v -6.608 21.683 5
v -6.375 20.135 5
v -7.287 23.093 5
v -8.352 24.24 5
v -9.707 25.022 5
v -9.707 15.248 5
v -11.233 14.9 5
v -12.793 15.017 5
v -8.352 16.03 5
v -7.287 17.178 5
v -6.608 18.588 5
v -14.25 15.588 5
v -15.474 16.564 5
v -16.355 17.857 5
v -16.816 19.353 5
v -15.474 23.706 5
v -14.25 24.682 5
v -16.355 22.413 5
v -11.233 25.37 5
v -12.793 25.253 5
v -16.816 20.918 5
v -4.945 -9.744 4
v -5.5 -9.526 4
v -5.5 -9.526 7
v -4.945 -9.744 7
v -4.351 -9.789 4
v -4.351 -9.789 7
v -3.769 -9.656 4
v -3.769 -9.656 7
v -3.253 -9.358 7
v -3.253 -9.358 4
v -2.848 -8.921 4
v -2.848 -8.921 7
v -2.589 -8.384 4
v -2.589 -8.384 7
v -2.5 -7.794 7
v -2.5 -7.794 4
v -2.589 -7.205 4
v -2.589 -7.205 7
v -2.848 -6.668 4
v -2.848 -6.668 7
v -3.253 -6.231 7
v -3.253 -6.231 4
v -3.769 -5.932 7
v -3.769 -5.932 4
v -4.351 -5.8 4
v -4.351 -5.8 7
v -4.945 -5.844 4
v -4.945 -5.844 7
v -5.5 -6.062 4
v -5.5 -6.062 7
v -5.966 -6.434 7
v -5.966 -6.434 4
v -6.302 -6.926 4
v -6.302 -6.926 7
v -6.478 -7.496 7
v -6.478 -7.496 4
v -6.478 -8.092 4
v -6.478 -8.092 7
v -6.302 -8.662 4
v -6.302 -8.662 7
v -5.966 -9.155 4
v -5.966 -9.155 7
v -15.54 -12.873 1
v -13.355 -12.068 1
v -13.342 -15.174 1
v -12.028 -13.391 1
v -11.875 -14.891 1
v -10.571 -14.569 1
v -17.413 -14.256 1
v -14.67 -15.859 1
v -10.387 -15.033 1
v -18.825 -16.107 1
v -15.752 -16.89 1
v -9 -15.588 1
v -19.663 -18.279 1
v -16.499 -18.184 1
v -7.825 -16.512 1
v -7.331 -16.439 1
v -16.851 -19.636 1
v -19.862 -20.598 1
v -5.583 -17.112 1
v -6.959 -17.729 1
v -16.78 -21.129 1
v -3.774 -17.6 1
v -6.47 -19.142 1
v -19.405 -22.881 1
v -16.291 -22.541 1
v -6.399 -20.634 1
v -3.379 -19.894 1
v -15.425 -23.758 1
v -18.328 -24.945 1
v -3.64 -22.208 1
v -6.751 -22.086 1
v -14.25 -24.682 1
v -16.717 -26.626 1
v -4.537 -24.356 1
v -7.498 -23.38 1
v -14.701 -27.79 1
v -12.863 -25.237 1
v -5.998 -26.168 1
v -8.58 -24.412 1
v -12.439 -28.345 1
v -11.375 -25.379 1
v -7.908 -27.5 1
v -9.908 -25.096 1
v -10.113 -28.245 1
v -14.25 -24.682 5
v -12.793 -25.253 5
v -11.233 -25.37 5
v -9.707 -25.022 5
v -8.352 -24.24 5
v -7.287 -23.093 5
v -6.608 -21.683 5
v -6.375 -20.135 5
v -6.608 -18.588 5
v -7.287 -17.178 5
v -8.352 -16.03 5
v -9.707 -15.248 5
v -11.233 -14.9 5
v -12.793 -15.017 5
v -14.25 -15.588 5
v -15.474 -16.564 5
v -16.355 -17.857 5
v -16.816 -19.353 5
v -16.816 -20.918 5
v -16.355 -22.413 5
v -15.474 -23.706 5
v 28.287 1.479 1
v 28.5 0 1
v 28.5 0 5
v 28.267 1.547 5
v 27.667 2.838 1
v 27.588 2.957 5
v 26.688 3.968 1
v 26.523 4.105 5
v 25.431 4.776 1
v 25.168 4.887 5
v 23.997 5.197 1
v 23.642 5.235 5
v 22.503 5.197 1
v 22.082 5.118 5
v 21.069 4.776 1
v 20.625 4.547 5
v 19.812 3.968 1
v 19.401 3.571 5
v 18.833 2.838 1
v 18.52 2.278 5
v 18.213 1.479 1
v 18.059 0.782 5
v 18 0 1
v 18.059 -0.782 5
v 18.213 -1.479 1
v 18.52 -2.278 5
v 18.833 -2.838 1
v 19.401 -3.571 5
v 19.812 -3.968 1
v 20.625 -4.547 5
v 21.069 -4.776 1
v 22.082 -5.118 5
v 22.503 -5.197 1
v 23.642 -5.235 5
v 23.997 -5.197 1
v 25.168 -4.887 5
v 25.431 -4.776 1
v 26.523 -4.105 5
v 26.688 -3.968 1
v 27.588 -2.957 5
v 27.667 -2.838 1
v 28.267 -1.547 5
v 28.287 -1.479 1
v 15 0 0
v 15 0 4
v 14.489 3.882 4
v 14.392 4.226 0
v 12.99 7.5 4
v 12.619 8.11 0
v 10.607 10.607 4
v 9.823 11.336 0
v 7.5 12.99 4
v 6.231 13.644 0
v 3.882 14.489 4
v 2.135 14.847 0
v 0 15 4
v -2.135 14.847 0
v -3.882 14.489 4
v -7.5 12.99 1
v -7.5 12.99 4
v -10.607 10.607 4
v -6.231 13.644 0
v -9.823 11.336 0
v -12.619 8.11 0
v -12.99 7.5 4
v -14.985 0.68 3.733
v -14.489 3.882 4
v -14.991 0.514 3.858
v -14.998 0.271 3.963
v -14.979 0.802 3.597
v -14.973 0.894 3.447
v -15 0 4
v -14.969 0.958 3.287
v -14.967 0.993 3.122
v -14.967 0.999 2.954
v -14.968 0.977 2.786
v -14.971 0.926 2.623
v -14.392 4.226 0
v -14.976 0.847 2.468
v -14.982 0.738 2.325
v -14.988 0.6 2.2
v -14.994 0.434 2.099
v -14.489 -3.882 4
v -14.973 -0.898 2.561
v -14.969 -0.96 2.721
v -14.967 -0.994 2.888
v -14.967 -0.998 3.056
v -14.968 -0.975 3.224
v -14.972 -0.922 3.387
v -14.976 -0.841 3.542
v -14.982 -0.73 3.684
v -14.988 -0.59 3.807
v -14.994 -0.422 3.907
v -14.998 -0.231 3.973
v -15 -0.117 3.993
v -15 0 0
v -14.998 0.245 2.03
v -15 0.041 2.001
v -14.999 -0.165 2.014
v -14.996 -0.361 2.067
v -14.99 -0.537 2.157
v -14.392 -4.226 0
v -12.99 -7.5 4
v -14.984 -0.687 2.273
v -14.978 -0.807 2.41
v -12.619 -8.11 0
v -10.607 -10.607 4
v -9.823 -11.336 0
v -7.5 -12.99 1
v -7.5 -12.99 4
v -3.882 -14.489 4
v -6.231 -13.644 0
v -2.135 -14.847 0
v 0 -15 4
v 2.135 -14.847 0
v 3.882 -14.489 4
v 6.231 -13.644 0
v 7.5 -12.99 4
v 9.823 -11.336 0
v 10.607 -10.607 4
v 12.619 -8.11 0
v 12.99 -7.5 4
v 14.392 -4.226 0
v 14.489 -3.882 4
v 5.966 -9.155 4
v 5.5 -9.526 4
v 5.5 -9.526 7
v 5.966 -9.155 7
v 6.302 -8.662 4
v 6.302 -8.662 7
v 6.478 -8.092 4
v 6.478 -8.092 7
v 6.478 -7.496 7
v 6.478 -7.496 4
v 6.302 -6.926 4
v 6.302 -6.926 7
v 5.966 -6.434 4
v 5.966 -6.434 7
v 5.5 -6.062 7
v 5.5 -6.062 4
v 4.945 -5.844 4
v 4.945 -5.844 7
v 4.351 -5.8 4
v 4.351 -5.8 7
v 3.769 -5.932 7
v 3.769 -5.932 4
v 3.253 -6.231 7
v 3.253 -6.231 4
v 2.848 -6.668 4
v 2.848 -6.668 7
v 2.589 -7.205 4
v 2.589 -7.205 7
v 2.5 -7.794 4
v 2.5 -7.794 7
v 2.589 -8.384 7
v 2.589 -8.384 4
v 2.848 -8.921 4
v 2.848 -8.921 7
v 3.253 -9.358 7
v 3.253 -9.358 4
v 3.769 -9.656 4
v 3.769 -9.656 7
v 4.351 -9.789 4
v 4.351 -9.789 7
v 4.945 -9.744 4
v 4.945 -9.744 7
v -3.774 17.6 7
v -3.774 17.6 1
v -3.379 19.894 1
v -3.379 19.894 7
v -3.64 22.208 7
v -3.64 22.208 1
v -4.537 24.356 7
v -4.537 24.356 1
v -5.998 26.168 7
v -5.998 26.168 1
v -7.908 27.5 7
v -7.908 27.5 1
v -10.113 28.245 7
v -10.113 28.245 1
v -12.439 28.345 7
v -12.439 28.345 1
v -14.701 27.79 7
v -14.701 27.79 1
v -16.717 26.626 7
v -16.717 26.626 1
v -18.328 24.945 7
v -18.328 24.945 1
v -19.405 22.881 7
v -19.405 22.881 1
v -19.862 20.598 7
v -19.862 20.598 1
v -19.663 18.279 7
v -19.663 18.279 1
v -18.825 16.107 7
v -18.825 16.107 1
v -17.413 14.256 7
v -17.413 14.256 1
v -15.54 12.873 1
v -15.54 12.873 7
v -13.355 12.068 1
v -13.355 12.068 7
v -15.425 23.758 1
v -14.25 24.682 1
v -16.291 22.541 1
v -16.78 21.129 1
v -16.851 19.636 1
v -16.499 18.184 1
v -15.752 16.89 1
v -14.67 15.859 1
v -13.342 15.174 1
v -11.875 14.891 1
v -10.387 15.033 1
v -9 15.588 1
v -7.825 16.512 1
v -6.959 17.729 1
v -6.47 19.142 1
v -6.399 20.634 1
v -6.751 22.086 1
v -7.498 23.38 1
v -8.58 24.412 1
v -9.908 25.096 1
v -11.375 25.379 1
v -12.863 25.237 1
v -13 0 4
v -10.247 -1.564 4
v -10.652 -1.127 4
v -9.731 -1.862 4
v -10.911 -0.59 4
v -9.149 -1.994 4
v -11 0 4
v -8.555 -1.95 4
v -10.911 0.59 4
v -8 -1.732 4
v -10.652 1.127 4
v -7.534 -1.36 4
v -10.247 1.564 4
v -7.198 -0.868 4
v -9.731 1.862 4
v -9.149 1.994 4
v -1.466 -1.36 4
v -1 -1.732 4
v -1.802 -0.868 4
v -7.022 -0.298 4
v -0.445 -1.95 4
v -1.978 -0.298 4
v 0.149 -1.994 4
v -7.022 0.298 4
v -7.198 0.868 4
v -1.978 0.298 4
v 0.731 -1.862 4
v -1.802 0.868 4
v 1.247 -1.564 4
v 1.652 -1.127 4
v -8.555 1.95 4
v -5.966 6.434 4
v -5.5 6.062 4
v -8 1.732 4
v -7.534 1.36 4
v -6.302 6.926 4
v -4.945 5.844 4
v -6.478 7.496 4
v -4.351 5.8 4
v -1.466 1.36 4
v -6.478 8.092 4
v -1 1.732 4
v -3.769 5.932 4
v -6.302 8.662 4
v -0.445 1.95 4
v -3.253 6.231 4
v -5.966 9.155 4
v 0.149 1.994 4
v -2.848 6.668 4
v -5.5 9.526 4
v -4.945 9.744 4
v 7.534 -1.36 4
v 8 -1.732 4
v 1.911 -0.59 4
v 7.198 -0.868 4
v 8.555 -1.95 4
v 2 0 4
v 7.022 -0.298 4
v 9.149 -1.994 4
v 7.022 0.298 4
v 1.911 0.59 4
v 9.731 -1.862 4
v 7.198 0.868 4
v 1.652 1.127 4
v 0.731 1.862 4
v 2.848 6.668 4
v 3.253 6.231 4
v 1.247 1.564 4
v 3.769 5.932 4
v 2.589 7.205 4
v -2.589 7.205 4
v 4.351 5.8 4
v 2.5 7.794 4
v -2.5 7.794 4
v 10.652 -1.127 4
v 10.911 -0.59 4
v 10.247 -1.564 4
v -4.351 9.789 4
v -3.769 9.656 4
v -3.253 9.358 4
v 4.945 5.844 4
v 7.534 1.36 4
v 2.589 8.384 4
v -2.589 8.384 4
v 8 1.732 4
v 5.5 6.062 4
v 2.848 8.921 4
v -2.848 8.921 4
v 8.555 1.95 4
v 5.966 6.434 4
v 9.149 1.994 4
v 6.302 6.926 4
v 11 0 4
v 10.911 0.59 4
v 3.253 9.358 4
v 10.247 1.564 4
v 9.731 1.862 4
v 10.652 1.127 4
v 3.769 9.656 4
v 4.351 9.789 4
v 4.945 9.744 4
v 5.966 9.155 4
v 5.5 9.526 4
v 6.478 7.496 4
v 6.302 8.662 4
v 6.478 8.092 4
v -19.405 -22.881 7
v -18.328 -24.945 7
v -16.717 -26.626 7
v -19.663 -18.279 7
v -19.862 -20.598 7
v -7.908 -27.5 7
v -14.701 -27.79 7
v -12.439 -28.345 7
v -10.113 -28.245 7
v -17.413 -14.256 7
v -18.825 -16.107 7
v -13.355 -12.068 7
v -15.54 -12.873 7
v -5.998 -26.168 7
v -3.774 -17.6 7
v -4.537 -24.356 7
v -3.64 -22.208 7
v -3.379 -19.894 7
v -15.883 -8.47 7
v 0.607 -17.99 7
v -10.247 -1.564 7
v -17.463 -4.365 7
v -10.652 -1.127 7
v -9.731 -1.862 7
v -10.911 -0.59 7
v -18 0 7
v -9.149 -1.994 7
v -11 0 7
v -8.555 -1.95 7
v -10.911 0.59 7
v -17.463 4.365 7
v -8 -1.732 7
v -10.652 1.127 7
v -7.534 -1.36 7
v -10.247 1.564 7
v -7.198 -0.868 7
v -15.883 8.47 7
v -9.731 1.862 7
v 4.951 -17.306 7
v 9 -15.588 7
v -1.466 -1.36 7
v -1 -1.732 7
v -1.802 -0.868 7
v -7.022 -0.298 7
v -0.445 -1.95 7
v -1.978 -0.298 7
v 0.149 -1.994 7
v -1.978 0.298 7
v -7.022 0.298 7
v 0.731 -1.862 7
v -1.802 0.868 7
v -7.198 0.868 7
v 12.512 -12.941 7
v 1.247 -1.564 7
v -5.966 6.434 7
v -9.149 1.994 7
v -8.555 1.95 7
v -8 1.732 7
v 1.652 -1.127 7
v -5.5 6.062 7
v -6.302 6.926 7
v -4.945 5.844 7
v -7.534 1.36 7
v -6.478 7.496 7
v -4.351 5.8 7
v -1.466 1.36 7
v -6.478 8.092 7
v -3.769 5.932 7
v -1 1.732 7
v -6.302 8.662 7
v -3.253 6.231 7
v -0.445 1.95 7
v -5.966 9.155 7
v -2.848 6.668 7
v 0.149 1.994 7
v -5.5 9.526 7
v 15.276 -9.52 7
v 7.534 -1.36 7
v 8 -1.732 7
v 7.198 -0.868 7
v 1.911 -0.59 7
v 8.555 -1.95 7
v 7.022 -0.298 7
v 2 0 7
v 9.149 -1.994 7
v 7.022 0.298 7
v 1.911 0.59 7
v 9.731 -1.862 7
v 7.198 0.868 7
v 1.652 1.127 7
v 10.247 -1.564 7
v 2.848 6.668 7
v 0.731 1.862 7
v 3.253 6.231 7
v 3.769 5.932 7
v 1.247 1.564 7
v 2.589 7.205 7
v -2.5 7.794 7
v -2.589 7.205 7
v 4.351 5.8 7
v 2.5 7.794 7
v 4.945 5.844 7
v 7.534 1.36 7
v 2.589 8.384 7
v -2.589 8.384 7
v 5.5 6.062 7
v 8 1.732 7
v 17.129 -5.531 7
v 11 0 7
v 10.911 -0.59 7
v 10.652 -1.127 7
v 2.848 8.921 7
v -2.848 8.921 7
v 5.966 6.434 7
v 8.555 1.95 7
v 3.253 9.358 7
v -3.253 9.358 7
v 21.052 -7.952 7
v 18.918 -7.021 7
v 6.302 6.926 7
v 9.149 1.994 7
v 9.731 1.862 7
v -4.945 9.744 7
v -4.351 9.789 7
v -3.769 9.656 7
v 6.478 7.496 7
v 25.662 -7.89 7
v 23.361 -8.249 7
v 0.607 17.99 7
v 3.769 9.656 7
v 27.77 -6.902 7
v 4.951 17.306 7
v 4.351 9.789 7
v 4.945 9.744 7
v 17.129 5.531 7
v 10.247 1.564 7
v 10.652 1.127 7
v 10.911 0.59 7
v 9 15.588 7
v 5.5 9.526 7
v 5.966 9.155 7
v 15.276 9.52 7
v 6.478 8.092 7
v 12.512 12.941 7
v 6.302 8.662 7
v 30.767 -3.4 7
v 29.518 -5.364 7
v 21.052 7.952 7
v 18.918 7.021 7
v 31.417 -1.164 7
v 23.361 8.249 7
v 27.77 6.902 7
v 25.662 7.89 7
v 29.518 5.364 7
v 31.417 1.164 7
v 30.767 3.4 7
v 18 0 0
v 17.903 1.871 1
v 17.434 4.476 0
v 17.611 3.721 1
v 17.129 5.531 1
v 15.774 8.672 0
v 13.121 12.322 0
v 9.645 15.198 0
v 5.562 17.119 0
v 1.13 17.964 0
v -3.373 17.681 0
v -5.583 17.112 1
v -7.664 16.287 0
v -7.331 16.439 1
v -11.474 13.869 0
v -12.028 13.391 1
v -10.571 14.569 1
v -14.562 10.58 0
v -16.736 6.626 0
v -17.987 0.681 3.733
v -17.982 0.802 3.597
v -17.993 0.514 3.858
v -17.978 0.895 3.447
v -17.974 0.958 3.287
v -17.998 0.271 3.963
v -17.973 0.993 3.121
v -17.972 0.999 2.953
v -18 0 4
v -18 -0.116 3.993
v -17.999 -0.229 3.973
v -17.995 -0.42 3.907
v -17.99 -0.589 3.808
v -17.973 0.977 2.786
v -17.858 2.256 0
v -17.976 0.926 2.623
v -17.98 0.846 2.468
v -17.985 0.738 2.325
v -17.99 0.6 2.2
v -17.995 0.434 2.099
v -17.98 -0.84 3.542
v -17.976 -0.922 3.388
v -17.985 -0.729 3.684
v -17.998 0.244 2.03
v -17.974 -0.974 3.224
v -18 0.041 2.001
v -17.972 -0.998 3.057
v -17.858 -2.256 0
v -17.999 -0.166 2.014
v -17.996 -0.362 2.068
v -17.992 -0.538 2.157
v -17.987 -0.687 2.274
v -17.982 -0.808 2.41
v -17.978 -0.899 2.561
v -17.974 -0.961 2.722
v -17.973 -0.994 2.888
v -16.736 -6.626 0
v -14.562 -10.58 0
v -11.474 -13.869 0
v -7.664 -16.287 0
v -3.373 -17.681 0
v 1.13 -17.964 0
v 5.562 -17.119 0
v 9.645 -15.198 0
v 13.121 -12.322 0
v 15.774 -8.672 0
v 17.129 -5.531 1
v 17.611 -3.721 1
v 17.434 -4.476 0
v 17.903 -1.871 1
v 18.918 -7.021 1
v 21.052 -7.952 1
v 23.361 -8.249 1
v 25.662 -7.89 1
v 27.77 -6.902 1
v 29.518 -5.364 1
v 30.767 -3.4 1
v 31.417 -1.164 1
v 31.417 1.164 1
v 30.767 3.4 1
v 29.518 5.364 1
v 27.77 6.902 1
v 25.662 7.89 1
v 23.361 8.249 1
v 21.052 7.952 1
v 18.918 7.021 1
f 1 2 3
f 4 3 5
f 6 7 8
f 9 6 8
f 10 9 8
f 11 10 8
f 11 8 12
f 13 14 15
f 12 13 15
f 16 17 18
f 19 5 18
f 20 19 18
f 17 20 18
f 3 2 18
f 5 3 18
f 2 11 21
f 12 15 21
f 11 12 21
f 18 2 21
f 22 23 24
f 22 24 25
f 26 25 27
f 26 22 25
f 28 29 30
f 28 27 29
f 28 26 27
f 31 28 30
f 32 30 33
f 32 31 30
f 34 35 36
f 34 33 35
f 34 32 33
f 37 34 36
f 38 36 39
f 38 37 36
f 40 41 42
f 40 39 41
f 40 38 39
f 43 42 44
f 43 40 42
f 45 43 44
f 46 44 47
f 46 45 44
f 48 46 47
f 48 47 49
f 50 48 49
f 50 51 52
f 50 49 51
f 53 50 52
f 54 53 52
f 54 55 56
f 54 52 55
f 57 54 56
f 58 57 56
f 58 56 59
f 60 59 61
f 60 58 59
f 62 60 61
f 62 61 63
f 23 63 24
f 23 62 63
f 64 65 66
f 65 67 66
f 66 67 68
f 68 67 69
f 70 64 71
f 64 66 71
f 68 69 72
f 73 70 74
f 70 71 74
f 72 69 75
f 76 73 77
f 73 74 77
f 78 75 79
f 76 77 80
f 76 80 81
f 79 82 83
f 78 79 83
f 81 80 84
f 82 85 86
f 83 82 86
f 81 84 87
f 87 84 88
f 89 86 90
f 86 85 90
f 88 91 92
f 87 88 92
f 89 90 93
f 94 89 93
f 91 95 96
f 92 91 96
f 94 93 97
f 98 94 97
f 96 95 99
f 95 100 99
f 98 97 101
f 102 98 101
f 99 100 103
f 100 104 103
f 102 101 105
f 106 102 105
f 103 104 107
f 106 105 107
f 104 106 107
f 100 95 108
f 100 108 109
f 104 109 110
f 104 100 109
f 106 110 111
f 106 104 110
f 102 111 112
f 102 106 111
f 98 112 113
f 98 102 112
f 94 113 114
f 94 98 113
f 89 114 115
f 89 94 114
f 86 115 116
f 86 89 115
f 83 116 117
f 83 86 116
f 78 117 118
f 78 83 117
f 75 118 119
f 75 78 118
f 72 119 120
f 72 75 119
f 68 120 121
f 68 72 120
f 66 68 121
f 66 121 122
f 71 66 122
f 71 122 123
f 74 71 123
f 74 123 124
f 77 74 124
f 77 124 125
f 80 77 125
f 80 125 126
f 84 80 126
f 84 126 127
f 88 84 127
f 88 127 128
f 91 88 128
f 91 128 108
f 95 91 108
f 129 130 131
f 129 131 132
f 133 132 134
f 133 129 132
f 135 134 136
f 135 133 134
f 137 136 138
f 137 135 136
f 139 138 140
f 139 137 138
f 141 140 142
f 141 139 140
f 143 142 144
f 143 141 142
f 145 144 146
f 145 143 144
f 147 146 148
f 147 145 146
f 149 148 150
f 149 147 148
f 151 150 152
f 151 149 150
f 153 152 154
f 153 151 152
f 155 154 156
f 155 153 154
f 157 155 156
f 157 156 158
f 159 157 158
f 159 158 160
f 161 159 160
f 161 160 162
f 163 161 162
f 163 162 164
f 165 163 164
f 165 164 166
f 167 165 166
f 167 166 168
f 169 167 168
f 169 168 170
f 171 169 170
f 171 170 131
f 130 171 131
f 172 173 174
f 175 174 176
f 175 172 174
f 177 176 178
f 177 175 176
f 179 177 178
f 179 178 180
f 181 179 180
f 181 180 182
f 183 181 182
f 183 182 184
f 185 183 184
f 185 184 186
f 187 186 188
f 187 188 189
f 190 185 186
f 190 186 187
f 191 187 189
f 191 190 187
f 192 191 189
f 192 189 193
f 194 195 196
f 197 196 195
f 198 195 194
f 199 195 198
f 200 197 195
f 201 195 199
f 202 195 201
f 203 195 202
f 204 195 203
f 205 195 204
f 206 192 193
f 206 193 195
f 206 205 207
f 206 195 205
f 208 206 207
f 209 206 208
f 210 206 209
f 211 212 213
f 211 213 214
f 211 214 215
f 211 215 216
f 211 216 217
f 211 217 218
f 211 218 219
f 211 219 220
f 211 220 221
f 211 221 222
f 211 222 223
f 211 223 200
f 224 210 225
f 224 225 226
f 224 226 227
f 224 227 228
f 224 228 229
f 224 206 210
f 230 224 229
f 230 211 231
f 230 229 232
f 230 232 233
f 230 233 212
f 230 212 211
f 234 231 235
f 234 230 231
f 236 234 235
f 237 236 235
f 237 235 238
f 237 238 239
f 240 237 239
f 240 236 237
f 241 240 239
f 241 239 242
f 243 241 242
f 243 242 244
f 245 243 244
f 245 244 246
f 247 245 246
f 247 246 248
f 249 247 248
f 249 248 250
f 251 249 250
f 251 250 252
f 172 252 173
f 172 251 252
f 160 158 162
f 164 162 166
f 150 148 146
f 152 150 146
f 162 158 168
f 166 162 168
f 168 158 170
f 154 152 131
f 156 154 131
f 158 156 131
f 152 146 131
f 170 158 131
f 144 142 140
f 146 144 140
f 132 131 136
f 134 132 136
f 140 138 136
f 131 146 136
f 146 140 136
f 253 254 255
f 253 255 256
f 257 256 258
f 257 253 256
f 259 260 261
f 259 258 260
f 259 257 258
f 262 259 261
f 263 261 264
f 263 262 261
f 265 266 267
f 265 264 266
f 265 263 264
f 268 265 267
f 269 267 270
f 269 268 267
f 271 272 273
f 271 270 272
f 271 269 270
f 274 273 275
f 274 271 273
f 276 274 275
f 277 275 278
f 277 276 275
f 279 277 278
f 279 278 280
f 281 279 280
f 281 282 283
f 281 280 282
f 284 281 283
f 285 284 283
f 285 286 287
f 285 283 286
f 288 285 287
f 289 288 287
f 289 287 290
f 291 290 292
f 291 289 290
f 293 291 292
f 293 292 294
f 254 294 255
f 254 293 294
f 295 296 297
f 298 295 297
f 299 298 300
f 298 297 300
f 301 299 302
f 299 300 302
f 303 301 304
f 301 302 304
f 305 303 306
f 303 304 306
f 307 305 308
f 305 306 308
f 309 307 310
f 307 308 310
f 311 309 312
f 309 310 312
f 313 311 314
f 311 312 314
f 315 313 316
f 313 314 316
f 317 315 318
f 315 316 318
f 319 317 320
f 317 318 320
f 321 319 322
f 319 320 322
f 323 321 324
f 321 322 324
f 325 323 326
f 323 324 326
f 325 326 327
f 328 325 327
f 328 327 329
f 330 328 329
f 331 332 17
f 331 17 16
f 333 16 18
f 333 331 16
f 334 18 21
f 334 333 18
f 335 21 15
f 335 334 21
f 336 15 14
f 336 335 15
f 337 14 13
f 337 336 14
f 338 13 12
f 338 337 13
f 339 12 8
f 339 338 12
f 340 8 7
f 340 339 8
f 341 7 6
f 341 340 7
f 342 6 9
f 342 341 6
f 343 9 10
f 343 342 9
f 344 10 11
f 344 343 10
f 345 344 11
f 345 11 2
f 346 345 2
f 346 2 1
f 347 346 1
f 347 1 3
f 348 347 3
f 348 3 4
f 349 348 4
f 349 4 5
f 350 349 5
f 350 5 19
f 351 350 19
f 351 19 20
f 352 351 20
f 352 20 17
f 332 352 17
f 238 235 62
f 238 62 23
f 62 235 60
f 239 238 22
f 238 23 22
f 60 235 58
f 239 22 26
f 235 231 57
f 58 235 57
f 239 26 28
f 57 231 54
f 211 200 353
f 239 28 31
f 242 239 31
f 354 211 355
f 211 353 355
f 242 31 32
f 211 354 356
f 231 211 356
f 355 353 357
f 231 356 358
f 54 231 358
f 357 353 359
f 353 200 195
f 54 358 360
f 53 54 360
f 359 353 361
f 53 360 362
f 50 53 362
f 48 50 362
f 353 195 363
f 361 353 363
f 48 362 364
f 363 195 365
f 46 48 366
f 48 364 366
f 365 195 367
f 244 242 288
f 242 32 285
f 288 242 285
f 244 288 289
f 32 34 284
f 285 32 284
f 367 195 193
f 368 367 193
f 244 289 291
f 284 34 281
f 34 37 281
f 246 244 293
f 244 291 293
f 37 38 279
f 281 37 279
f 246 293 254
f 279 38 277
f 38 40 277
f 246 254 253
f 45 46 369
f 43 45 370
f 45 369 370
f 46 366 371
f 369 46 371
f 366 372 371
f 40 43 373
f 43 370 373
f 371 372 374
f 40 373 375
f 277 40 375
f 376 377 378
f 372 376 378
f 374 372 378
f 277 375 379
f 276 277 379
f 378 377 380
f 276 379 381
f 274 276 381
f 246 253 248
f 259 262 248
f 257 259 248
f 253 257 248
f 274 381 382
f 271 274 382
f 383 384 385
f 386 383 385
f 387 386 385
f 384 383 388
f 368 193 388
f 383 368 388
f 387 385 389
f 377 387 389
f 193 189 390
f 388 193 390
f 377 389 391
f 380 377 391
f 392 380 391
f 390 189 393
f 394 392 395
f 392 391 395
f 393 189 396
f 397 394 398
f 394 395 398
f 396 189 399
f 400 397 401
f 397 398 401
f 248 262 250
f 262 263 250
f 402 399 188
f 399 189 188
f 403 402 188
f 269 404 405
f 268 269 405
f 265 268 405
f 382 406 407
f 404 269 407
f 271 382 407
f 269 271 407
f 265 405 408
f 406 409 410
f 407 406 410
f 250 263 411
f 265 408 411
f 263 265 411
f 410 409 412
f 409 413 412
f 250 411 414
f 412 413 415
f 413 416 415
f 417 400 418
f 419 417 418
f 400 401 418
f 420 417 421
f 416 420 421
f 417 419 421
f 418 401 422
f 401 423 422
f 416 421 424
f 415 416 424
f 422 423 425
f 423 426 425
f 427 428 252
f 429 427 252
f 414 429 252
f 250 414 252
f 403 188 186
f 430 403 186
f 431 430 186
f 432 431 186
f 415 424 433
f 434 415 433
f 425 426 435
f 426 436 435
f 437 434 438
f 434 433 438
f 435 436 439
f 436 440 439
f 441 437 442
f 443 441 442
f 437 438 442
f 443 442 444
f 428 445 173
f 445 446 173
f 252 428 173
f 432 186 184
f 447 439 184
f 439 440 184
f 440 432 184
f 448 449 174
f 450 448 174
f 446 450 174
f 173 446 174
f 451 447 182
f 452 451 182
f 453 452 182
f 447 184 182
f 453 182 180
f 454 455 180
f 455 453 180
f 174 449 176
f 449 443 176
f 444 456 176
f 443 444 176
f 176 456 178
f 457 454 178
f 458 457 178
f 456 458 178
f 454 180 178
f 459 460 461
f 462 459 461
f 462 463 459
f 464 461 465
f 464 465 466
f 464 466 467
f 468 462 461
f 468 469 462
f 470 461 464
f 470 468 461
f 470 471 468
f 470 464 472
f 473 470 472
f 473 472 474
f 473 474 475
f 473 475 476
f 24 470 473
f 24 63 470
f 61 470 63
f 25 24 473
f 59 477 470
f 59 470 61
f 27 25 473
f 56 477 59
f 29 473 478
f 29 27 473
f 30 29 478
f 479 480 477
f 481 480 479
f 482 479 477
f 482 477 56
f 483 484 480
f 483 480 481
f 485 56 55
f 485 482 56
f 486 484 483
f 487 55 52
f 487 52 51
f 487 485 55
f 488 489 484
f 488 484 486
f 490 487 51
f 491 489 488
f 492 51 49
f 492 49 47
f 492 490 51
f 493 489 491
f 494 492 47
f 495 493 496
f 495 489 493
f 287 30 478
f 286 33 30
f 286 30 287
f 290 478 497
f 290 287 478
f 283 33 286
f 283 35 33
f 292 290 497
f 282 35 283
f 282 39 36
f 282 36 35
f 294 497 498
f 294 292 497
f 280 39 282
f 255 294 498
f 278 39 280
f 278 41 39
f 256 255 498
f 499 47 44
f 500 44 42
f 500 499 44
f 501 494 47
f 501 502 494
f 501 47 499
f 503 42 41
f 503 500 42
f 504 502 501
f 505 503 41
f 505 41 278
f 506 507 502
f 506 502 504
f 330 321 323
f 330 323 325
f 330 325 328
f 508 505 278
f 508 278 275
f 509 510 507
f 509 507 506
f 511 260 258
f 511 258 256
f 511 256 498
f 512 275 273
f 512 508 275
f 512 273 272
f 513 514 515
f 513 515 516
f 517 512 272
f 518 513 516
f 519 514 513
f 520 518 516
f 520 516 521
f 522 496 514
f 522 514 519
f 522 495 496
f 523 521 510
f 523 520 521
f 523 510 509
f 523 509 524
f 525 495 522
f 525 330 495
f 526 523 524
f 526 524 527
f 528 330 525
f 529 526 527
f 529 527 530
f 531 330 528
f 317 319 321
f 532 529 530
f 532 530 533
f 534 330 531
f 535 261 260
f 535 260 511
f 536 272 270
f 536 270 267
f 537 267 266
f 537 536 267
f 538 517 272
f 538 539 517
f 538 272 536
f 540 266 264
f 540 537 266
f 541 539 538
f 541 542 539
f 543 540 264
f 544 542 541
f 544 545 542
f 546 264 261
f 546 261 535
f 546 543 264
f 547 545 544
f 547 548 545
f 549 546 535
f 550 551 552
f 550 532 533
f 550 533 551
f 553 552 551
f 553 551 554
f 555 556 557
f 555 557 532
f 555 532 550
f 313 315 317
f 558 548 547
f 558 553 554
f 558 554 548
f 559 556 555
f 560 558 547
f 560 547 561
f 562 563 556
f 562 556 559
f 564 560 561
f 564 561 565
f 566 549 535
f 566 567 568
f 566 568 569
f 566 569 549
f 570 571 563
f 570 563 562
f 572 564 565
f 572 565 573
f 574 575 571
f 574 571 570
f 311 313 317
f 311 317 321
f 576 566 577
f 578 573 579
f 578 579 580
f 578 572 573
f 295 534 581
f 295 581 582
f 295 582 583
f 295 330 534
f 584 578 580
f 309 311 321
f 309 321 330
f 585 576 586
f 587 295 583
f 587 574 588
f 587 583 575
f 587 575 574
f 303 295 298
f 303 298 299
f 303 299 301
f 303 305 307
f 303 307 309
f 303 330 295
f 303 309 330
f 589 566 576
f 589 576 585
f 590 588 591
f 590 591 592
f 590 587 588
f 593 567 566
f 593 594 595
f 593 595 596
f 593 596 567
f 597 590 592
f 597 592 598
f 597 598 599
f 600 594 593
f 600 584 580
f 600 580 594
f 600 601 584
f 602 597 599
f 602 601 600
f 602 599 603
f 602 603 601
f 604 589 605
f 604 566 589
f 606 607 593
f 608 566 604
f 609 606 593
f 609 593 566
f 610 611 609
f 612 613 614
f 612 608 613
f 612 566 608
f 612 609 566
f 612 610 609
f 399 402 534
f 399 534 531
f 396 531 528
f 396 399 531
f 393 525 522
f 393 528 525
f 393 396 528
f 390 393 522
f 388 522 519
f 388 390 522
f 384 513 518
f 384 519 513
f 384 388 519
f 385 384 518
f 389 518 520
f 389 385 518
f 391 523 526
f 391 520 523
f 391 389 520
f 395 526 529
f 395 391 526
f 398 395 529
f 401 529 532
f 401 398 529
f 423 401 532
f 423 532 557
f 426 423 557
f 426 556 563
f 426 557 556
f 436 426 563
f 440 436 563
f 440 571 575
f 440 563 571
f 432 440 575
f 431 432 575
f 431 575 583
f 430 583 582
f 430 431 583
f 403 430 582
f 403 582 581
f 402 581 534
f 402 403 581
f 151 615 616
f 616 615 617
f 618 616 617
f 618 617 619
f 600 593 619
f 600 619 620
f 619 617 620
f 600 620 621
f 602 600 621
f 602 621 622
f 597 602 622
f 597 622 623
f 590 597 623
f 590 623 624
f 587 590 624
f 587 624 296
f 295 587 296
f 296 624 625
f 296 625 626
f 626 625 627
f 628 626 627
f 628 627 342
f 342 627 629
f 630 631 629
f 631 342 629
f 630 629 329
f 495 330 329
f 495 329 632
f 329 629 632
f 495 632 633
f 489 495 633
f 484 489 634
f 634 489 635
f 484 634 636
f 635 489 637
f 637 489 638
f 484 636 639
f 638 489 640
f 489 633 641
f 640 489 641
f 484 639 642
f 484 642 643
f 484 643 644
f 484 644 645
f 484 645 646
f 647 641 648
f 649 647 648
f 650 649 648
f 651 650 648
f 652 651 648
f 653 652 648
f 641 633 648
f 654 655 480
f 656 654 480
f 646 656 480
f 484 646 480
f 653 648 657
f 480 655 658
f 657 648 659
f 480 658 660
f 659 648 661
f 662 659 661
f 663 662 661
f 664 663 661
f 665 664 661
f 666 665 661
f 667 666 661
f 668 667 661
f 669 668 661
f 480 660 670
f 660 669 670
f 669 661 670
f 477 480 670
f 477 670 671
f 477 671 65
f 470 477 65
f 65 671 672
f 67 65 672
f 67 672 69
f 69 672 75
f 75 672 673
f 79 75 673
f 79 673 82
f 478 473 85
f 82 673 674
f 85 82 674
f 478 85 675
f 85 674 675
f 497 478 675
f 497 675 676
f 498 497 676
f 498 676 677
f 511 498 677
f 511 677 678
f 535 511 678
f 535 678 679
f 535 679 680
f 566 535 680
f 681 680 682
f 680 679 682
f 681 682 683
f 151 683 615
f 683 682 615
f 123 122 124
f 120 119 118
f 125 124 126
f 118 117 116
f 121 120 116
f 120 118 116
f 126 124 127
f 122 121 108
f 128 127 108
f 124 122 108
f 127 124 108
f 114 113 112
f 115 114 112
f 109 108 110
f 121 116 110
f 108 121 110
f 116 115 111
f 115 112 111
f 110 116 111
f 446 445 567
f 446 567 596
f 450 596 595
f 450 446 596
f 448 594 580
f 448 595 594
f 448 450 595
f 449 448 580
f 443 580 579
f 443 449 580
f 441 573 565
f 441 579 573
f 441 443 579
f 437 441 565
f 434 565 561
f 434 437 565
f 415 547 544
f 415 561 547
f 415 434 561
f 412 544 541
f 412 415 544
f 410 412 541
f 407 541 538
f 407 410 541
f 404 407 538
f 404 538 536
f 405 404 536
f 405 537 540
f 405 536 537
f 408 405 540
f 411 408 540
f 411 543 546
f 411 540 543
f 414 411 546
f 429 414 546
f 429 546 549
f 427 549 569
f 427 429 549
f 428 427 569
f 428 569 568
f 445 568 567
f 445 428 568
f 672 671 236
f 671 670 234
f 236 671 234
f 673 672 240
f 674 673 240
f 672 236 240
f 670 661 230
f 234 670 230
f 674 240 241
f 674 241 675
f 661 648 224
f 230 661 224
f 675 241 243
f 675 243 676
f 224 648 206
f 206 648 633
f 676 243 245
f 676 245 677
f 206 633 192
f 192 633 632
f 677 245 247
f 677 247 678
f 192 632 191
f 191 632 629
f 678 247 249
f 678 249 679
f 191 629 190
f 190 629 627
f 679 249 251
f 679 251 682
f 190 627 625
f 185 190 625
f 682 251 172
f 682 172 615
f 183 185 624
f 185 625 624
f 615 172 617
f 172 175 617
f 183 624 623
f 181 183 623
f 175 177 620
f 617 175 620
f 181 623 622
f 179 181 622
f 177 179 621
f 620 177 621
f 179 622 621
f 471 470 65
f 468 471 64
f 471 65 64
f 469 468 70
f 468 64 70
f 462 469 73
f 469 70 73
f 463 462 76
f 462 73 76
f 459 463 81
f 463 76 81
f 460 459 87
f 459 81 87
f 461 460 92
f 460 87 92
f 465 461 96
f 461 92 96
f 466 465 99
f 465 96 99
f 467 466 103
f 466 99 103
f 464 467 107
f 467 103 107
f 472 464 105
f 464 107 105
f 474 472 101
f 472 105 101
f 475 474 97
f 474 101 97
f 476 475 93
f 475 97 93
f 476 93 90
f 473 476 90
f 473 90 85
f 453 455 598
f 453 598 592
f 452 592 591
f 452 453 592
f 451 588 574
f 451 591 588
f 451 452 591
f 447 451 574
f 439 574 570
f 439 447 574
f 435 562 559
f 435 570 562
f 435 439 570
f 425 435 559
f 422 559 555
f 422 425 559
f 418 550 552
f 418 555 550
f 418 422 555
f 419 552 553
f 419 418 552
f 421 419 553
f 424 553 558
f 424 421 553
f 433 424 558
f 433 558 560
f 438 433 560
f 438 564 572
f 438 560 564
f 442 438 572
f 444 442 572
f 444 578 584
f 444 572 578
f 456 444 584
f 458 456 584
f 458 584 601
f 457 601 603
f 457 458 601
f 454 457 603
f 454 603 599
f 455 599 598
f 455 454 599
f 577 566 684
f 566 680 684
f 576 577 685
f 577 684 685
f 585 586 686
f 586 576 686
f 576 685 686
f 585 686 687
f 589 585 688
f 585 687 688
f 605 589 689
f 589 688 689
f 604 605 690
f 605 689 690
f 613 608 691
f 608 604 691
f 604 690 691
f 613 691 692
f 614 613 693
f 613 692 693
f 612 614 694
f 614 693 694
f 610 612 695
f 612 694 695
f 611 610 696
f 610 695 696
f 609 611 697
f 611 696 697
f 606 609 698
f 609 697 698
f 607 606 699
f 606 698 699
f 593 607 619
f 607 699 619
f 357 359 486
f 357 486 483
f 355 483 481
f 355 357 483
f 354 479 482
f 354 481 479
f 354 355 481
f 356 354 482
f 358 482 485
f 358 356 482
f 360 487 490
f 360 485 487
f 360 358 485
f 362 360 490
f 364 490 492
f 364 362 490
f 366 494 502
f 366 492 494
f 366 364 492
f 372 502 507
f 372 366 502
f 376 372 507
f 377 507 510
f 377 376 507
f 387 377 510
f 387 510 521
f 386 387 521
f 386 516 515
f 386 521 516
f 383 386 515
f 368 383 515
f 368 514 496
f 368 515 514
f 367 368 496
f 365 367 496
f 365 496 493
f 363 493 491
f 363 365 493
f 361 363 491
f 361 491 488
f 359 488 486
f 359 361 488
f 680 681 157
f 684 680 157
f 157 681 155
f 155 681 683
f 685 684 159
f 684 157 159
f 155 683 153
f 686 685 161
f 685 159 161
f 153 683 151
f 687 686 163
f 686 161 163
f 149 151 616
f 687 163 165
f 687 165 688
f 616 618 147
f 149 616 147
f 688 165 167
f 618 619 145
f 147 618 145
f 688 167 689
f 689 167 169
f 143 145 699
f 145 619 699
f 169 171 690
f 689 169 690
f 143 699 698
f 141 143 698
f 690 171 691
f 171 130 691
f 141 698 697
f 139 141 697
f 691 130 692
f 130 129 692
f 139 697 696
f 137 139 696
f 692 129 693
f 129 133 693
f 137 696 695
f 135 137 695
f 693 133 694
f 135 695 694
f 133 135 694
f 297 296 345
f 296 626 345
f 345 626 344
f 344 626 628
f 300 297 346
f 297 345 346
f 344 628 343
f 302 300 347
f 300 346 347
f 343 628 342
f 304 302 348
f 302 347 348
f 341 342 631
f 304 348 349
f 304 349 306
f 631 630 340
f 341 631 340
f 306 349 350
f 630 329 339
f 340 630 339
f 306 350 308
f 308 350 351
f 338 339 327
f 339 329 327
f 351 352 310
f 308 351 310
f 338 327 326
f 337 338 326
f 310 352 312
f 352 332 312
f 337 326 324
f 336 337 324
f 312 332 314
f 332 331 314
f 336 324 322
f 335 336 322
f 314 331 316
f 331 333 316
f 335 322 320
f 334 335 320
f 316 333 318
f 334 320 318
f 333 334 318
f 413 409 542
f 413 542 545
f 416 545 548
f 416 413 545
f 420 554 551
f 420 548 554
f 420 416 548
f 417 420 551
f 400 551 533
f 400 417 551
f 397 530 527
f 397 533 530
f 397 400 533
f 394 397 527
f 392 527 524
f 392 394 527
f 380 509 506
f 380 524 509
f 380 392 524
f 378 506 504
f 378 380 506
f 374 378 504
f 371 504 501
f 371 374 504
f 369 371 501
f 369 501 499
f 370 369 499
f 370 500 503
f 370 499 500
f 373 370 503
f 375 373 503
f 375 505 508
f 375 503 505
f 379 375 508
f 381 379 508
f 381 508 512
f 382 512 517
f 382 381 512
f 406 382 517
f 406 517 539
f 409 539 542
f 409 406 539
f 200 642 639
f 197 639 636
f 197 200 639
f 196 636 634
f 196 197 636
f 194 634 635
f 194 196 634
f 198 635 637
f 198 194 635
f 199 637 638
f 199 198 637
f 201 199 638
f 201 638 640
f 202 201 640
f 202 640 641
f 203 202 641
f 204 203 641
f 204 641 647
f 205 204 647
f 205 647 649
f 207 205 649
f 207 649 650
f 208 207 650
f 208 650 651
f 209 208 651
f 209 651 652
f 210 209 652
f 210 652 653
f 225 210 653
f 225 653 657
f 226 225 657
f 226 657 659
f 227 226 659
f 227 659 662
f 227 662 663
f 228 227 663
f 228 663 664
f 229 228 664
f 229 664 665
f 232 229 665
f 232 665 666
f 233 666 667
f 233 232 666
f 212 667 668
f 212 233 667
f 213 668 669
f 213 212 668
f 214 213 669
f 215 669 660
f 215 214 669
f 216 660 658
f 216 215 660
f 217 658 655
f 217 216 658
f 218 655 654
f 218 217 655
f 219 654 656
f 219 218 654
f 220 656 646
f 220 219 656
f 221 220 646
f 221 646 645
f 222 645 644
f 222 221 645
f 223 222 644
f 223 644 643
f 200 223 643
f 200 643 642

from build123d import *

# Parameters (mm, degrees)
CYLINDER008_R     = 2
CYLINDER008_DEPTH = 10
ARRAY002_COUNT    = 6
CYLINDER035_R     = 1
CYLINDER035_DEPTH = 10
CYLINDER009_R     = 2
CYLINDER009_DEPTH = 10
CYLINDER001_R     = 15
CYLINDER001_DEPTH = 4
CYLINDER_R        = 18
CYLINDER_DEPTH    = 7
CYLINDER002_R     = 5.25
CYLINDER002_DEPTH = 4
CYLINDER003_R     = 8.25
CYLINDER003_DEPTH = 6
ARRAY_COUNT       = 3


with BuildPart() as array002:
    # Cylinder008 → Cylinder008 (new body)
    with BuildSketch(Plane(origin=(9, 0, 0), x_dir=(1, 0, 0), z_dir=(0, 0, 1))):
        Circle(CYLINDER008_R)
    extrude(amount=CYLINDER008_DEPTH)

    # Array002: Array002 ×6 about axis
    array002_axis = Axis((0, 0, 0), (0, 0, 1))


with BuildPart() as array002_1:
    add(array002.part)
    for i in range(1, ARRAY002_COUNT):
        add(array002.part.rotate(array002_axis, i * 360 / ARRAY002_COUNT))


with BuildPart() as cylinder010:
    # Cylinder035 → Cylinder035 (new body)
    with BuildSketch(Plane(origin=(-13, 0, 3), x_dir=(0, 0, 1), z_dir=(-1, 0, 0))):
        Circle(CYLINDER035_R)
    extrude(amount=CYLINDER035_DEPTH)


with BuildPart() as fusion027:
    # Cylinder009 → Cylinder009 (new body)
    with BuildSketch(Plane.XY):
        Circle(CYLINDER009_R)
    extrude(amount=CYLINDER009_DEPTH)

    # Fusion027: union Array002, Cylinder010
    add(array002_1.part)
    add(cylinder010.part)


with BuildPart() as cylinder001:
    # Cylinder001 → Cylinder001 (new body)
    with BuildSketch(Plane.XY):
        Circle(CYLINDER001_R)
    extrude(amount=CYLINDER001_DEPTH)


with BuildPart() as cut:
    # Cylinder → Cylinder (new body)
    with BuildSketch(Plane.XY):
        Circle(CYLINDER_R)
    extrude(amount=CYLINDER_DEPTH)

    # Cut: cut Cylinder001
    add(cylinder001.part, mode=Mode.SUBTRACT)


with BuildPart() as cylinder002:
    # Cylinder002 → Cylinder002 (new body)
    with BuildSketch(Plane.XY):
        Circle(CYLINDER002_R)
    extrude(amount=CYLINDER002_DEPTH)


with BuildPart() as toplevelpart_materialtestholder:
    # Cylinder003 → Cylinder003 (new body)
    with BuildSketch(Plane.XY):
        Circle(CYLINDER003_R)
    extrude(amount=CYLINDER003_DEPTH)

    # Cut001: cut Cylinder002
    add(cylinder002.part, mode=Mode.SUBTRACT)


with BuildPart() as toplevelpart_materialtestholder_1:
    # Cut001 placement: moved
    add(toplevelpart_materialtestholder.part.moved(Location((23.25, 0, 1))))

    # Array: TopLevelPart-MaterialTestHolder ×3 about axis
    array_axis = Axis((0, 0, 0), (0, 0, 1))


with BuildPart() as toplevelpart_materialtestholder_2:
    add(toplevelpart_materialtestholder_1.part)
    for i in range(1, ARRAY_COUNT):
        add(toplevelpart_materialtestholder_1.part.rotate(array_axis, i * 360 / ARRAY_COUNT))

    # Fusion: union Cut
    add(cut.part)

    # Cut006: cut Fusion027
    add(fusion027.part, mode=Mode.SUBTRACT)


solid = toplevelpart_materialtestholder_2.part
